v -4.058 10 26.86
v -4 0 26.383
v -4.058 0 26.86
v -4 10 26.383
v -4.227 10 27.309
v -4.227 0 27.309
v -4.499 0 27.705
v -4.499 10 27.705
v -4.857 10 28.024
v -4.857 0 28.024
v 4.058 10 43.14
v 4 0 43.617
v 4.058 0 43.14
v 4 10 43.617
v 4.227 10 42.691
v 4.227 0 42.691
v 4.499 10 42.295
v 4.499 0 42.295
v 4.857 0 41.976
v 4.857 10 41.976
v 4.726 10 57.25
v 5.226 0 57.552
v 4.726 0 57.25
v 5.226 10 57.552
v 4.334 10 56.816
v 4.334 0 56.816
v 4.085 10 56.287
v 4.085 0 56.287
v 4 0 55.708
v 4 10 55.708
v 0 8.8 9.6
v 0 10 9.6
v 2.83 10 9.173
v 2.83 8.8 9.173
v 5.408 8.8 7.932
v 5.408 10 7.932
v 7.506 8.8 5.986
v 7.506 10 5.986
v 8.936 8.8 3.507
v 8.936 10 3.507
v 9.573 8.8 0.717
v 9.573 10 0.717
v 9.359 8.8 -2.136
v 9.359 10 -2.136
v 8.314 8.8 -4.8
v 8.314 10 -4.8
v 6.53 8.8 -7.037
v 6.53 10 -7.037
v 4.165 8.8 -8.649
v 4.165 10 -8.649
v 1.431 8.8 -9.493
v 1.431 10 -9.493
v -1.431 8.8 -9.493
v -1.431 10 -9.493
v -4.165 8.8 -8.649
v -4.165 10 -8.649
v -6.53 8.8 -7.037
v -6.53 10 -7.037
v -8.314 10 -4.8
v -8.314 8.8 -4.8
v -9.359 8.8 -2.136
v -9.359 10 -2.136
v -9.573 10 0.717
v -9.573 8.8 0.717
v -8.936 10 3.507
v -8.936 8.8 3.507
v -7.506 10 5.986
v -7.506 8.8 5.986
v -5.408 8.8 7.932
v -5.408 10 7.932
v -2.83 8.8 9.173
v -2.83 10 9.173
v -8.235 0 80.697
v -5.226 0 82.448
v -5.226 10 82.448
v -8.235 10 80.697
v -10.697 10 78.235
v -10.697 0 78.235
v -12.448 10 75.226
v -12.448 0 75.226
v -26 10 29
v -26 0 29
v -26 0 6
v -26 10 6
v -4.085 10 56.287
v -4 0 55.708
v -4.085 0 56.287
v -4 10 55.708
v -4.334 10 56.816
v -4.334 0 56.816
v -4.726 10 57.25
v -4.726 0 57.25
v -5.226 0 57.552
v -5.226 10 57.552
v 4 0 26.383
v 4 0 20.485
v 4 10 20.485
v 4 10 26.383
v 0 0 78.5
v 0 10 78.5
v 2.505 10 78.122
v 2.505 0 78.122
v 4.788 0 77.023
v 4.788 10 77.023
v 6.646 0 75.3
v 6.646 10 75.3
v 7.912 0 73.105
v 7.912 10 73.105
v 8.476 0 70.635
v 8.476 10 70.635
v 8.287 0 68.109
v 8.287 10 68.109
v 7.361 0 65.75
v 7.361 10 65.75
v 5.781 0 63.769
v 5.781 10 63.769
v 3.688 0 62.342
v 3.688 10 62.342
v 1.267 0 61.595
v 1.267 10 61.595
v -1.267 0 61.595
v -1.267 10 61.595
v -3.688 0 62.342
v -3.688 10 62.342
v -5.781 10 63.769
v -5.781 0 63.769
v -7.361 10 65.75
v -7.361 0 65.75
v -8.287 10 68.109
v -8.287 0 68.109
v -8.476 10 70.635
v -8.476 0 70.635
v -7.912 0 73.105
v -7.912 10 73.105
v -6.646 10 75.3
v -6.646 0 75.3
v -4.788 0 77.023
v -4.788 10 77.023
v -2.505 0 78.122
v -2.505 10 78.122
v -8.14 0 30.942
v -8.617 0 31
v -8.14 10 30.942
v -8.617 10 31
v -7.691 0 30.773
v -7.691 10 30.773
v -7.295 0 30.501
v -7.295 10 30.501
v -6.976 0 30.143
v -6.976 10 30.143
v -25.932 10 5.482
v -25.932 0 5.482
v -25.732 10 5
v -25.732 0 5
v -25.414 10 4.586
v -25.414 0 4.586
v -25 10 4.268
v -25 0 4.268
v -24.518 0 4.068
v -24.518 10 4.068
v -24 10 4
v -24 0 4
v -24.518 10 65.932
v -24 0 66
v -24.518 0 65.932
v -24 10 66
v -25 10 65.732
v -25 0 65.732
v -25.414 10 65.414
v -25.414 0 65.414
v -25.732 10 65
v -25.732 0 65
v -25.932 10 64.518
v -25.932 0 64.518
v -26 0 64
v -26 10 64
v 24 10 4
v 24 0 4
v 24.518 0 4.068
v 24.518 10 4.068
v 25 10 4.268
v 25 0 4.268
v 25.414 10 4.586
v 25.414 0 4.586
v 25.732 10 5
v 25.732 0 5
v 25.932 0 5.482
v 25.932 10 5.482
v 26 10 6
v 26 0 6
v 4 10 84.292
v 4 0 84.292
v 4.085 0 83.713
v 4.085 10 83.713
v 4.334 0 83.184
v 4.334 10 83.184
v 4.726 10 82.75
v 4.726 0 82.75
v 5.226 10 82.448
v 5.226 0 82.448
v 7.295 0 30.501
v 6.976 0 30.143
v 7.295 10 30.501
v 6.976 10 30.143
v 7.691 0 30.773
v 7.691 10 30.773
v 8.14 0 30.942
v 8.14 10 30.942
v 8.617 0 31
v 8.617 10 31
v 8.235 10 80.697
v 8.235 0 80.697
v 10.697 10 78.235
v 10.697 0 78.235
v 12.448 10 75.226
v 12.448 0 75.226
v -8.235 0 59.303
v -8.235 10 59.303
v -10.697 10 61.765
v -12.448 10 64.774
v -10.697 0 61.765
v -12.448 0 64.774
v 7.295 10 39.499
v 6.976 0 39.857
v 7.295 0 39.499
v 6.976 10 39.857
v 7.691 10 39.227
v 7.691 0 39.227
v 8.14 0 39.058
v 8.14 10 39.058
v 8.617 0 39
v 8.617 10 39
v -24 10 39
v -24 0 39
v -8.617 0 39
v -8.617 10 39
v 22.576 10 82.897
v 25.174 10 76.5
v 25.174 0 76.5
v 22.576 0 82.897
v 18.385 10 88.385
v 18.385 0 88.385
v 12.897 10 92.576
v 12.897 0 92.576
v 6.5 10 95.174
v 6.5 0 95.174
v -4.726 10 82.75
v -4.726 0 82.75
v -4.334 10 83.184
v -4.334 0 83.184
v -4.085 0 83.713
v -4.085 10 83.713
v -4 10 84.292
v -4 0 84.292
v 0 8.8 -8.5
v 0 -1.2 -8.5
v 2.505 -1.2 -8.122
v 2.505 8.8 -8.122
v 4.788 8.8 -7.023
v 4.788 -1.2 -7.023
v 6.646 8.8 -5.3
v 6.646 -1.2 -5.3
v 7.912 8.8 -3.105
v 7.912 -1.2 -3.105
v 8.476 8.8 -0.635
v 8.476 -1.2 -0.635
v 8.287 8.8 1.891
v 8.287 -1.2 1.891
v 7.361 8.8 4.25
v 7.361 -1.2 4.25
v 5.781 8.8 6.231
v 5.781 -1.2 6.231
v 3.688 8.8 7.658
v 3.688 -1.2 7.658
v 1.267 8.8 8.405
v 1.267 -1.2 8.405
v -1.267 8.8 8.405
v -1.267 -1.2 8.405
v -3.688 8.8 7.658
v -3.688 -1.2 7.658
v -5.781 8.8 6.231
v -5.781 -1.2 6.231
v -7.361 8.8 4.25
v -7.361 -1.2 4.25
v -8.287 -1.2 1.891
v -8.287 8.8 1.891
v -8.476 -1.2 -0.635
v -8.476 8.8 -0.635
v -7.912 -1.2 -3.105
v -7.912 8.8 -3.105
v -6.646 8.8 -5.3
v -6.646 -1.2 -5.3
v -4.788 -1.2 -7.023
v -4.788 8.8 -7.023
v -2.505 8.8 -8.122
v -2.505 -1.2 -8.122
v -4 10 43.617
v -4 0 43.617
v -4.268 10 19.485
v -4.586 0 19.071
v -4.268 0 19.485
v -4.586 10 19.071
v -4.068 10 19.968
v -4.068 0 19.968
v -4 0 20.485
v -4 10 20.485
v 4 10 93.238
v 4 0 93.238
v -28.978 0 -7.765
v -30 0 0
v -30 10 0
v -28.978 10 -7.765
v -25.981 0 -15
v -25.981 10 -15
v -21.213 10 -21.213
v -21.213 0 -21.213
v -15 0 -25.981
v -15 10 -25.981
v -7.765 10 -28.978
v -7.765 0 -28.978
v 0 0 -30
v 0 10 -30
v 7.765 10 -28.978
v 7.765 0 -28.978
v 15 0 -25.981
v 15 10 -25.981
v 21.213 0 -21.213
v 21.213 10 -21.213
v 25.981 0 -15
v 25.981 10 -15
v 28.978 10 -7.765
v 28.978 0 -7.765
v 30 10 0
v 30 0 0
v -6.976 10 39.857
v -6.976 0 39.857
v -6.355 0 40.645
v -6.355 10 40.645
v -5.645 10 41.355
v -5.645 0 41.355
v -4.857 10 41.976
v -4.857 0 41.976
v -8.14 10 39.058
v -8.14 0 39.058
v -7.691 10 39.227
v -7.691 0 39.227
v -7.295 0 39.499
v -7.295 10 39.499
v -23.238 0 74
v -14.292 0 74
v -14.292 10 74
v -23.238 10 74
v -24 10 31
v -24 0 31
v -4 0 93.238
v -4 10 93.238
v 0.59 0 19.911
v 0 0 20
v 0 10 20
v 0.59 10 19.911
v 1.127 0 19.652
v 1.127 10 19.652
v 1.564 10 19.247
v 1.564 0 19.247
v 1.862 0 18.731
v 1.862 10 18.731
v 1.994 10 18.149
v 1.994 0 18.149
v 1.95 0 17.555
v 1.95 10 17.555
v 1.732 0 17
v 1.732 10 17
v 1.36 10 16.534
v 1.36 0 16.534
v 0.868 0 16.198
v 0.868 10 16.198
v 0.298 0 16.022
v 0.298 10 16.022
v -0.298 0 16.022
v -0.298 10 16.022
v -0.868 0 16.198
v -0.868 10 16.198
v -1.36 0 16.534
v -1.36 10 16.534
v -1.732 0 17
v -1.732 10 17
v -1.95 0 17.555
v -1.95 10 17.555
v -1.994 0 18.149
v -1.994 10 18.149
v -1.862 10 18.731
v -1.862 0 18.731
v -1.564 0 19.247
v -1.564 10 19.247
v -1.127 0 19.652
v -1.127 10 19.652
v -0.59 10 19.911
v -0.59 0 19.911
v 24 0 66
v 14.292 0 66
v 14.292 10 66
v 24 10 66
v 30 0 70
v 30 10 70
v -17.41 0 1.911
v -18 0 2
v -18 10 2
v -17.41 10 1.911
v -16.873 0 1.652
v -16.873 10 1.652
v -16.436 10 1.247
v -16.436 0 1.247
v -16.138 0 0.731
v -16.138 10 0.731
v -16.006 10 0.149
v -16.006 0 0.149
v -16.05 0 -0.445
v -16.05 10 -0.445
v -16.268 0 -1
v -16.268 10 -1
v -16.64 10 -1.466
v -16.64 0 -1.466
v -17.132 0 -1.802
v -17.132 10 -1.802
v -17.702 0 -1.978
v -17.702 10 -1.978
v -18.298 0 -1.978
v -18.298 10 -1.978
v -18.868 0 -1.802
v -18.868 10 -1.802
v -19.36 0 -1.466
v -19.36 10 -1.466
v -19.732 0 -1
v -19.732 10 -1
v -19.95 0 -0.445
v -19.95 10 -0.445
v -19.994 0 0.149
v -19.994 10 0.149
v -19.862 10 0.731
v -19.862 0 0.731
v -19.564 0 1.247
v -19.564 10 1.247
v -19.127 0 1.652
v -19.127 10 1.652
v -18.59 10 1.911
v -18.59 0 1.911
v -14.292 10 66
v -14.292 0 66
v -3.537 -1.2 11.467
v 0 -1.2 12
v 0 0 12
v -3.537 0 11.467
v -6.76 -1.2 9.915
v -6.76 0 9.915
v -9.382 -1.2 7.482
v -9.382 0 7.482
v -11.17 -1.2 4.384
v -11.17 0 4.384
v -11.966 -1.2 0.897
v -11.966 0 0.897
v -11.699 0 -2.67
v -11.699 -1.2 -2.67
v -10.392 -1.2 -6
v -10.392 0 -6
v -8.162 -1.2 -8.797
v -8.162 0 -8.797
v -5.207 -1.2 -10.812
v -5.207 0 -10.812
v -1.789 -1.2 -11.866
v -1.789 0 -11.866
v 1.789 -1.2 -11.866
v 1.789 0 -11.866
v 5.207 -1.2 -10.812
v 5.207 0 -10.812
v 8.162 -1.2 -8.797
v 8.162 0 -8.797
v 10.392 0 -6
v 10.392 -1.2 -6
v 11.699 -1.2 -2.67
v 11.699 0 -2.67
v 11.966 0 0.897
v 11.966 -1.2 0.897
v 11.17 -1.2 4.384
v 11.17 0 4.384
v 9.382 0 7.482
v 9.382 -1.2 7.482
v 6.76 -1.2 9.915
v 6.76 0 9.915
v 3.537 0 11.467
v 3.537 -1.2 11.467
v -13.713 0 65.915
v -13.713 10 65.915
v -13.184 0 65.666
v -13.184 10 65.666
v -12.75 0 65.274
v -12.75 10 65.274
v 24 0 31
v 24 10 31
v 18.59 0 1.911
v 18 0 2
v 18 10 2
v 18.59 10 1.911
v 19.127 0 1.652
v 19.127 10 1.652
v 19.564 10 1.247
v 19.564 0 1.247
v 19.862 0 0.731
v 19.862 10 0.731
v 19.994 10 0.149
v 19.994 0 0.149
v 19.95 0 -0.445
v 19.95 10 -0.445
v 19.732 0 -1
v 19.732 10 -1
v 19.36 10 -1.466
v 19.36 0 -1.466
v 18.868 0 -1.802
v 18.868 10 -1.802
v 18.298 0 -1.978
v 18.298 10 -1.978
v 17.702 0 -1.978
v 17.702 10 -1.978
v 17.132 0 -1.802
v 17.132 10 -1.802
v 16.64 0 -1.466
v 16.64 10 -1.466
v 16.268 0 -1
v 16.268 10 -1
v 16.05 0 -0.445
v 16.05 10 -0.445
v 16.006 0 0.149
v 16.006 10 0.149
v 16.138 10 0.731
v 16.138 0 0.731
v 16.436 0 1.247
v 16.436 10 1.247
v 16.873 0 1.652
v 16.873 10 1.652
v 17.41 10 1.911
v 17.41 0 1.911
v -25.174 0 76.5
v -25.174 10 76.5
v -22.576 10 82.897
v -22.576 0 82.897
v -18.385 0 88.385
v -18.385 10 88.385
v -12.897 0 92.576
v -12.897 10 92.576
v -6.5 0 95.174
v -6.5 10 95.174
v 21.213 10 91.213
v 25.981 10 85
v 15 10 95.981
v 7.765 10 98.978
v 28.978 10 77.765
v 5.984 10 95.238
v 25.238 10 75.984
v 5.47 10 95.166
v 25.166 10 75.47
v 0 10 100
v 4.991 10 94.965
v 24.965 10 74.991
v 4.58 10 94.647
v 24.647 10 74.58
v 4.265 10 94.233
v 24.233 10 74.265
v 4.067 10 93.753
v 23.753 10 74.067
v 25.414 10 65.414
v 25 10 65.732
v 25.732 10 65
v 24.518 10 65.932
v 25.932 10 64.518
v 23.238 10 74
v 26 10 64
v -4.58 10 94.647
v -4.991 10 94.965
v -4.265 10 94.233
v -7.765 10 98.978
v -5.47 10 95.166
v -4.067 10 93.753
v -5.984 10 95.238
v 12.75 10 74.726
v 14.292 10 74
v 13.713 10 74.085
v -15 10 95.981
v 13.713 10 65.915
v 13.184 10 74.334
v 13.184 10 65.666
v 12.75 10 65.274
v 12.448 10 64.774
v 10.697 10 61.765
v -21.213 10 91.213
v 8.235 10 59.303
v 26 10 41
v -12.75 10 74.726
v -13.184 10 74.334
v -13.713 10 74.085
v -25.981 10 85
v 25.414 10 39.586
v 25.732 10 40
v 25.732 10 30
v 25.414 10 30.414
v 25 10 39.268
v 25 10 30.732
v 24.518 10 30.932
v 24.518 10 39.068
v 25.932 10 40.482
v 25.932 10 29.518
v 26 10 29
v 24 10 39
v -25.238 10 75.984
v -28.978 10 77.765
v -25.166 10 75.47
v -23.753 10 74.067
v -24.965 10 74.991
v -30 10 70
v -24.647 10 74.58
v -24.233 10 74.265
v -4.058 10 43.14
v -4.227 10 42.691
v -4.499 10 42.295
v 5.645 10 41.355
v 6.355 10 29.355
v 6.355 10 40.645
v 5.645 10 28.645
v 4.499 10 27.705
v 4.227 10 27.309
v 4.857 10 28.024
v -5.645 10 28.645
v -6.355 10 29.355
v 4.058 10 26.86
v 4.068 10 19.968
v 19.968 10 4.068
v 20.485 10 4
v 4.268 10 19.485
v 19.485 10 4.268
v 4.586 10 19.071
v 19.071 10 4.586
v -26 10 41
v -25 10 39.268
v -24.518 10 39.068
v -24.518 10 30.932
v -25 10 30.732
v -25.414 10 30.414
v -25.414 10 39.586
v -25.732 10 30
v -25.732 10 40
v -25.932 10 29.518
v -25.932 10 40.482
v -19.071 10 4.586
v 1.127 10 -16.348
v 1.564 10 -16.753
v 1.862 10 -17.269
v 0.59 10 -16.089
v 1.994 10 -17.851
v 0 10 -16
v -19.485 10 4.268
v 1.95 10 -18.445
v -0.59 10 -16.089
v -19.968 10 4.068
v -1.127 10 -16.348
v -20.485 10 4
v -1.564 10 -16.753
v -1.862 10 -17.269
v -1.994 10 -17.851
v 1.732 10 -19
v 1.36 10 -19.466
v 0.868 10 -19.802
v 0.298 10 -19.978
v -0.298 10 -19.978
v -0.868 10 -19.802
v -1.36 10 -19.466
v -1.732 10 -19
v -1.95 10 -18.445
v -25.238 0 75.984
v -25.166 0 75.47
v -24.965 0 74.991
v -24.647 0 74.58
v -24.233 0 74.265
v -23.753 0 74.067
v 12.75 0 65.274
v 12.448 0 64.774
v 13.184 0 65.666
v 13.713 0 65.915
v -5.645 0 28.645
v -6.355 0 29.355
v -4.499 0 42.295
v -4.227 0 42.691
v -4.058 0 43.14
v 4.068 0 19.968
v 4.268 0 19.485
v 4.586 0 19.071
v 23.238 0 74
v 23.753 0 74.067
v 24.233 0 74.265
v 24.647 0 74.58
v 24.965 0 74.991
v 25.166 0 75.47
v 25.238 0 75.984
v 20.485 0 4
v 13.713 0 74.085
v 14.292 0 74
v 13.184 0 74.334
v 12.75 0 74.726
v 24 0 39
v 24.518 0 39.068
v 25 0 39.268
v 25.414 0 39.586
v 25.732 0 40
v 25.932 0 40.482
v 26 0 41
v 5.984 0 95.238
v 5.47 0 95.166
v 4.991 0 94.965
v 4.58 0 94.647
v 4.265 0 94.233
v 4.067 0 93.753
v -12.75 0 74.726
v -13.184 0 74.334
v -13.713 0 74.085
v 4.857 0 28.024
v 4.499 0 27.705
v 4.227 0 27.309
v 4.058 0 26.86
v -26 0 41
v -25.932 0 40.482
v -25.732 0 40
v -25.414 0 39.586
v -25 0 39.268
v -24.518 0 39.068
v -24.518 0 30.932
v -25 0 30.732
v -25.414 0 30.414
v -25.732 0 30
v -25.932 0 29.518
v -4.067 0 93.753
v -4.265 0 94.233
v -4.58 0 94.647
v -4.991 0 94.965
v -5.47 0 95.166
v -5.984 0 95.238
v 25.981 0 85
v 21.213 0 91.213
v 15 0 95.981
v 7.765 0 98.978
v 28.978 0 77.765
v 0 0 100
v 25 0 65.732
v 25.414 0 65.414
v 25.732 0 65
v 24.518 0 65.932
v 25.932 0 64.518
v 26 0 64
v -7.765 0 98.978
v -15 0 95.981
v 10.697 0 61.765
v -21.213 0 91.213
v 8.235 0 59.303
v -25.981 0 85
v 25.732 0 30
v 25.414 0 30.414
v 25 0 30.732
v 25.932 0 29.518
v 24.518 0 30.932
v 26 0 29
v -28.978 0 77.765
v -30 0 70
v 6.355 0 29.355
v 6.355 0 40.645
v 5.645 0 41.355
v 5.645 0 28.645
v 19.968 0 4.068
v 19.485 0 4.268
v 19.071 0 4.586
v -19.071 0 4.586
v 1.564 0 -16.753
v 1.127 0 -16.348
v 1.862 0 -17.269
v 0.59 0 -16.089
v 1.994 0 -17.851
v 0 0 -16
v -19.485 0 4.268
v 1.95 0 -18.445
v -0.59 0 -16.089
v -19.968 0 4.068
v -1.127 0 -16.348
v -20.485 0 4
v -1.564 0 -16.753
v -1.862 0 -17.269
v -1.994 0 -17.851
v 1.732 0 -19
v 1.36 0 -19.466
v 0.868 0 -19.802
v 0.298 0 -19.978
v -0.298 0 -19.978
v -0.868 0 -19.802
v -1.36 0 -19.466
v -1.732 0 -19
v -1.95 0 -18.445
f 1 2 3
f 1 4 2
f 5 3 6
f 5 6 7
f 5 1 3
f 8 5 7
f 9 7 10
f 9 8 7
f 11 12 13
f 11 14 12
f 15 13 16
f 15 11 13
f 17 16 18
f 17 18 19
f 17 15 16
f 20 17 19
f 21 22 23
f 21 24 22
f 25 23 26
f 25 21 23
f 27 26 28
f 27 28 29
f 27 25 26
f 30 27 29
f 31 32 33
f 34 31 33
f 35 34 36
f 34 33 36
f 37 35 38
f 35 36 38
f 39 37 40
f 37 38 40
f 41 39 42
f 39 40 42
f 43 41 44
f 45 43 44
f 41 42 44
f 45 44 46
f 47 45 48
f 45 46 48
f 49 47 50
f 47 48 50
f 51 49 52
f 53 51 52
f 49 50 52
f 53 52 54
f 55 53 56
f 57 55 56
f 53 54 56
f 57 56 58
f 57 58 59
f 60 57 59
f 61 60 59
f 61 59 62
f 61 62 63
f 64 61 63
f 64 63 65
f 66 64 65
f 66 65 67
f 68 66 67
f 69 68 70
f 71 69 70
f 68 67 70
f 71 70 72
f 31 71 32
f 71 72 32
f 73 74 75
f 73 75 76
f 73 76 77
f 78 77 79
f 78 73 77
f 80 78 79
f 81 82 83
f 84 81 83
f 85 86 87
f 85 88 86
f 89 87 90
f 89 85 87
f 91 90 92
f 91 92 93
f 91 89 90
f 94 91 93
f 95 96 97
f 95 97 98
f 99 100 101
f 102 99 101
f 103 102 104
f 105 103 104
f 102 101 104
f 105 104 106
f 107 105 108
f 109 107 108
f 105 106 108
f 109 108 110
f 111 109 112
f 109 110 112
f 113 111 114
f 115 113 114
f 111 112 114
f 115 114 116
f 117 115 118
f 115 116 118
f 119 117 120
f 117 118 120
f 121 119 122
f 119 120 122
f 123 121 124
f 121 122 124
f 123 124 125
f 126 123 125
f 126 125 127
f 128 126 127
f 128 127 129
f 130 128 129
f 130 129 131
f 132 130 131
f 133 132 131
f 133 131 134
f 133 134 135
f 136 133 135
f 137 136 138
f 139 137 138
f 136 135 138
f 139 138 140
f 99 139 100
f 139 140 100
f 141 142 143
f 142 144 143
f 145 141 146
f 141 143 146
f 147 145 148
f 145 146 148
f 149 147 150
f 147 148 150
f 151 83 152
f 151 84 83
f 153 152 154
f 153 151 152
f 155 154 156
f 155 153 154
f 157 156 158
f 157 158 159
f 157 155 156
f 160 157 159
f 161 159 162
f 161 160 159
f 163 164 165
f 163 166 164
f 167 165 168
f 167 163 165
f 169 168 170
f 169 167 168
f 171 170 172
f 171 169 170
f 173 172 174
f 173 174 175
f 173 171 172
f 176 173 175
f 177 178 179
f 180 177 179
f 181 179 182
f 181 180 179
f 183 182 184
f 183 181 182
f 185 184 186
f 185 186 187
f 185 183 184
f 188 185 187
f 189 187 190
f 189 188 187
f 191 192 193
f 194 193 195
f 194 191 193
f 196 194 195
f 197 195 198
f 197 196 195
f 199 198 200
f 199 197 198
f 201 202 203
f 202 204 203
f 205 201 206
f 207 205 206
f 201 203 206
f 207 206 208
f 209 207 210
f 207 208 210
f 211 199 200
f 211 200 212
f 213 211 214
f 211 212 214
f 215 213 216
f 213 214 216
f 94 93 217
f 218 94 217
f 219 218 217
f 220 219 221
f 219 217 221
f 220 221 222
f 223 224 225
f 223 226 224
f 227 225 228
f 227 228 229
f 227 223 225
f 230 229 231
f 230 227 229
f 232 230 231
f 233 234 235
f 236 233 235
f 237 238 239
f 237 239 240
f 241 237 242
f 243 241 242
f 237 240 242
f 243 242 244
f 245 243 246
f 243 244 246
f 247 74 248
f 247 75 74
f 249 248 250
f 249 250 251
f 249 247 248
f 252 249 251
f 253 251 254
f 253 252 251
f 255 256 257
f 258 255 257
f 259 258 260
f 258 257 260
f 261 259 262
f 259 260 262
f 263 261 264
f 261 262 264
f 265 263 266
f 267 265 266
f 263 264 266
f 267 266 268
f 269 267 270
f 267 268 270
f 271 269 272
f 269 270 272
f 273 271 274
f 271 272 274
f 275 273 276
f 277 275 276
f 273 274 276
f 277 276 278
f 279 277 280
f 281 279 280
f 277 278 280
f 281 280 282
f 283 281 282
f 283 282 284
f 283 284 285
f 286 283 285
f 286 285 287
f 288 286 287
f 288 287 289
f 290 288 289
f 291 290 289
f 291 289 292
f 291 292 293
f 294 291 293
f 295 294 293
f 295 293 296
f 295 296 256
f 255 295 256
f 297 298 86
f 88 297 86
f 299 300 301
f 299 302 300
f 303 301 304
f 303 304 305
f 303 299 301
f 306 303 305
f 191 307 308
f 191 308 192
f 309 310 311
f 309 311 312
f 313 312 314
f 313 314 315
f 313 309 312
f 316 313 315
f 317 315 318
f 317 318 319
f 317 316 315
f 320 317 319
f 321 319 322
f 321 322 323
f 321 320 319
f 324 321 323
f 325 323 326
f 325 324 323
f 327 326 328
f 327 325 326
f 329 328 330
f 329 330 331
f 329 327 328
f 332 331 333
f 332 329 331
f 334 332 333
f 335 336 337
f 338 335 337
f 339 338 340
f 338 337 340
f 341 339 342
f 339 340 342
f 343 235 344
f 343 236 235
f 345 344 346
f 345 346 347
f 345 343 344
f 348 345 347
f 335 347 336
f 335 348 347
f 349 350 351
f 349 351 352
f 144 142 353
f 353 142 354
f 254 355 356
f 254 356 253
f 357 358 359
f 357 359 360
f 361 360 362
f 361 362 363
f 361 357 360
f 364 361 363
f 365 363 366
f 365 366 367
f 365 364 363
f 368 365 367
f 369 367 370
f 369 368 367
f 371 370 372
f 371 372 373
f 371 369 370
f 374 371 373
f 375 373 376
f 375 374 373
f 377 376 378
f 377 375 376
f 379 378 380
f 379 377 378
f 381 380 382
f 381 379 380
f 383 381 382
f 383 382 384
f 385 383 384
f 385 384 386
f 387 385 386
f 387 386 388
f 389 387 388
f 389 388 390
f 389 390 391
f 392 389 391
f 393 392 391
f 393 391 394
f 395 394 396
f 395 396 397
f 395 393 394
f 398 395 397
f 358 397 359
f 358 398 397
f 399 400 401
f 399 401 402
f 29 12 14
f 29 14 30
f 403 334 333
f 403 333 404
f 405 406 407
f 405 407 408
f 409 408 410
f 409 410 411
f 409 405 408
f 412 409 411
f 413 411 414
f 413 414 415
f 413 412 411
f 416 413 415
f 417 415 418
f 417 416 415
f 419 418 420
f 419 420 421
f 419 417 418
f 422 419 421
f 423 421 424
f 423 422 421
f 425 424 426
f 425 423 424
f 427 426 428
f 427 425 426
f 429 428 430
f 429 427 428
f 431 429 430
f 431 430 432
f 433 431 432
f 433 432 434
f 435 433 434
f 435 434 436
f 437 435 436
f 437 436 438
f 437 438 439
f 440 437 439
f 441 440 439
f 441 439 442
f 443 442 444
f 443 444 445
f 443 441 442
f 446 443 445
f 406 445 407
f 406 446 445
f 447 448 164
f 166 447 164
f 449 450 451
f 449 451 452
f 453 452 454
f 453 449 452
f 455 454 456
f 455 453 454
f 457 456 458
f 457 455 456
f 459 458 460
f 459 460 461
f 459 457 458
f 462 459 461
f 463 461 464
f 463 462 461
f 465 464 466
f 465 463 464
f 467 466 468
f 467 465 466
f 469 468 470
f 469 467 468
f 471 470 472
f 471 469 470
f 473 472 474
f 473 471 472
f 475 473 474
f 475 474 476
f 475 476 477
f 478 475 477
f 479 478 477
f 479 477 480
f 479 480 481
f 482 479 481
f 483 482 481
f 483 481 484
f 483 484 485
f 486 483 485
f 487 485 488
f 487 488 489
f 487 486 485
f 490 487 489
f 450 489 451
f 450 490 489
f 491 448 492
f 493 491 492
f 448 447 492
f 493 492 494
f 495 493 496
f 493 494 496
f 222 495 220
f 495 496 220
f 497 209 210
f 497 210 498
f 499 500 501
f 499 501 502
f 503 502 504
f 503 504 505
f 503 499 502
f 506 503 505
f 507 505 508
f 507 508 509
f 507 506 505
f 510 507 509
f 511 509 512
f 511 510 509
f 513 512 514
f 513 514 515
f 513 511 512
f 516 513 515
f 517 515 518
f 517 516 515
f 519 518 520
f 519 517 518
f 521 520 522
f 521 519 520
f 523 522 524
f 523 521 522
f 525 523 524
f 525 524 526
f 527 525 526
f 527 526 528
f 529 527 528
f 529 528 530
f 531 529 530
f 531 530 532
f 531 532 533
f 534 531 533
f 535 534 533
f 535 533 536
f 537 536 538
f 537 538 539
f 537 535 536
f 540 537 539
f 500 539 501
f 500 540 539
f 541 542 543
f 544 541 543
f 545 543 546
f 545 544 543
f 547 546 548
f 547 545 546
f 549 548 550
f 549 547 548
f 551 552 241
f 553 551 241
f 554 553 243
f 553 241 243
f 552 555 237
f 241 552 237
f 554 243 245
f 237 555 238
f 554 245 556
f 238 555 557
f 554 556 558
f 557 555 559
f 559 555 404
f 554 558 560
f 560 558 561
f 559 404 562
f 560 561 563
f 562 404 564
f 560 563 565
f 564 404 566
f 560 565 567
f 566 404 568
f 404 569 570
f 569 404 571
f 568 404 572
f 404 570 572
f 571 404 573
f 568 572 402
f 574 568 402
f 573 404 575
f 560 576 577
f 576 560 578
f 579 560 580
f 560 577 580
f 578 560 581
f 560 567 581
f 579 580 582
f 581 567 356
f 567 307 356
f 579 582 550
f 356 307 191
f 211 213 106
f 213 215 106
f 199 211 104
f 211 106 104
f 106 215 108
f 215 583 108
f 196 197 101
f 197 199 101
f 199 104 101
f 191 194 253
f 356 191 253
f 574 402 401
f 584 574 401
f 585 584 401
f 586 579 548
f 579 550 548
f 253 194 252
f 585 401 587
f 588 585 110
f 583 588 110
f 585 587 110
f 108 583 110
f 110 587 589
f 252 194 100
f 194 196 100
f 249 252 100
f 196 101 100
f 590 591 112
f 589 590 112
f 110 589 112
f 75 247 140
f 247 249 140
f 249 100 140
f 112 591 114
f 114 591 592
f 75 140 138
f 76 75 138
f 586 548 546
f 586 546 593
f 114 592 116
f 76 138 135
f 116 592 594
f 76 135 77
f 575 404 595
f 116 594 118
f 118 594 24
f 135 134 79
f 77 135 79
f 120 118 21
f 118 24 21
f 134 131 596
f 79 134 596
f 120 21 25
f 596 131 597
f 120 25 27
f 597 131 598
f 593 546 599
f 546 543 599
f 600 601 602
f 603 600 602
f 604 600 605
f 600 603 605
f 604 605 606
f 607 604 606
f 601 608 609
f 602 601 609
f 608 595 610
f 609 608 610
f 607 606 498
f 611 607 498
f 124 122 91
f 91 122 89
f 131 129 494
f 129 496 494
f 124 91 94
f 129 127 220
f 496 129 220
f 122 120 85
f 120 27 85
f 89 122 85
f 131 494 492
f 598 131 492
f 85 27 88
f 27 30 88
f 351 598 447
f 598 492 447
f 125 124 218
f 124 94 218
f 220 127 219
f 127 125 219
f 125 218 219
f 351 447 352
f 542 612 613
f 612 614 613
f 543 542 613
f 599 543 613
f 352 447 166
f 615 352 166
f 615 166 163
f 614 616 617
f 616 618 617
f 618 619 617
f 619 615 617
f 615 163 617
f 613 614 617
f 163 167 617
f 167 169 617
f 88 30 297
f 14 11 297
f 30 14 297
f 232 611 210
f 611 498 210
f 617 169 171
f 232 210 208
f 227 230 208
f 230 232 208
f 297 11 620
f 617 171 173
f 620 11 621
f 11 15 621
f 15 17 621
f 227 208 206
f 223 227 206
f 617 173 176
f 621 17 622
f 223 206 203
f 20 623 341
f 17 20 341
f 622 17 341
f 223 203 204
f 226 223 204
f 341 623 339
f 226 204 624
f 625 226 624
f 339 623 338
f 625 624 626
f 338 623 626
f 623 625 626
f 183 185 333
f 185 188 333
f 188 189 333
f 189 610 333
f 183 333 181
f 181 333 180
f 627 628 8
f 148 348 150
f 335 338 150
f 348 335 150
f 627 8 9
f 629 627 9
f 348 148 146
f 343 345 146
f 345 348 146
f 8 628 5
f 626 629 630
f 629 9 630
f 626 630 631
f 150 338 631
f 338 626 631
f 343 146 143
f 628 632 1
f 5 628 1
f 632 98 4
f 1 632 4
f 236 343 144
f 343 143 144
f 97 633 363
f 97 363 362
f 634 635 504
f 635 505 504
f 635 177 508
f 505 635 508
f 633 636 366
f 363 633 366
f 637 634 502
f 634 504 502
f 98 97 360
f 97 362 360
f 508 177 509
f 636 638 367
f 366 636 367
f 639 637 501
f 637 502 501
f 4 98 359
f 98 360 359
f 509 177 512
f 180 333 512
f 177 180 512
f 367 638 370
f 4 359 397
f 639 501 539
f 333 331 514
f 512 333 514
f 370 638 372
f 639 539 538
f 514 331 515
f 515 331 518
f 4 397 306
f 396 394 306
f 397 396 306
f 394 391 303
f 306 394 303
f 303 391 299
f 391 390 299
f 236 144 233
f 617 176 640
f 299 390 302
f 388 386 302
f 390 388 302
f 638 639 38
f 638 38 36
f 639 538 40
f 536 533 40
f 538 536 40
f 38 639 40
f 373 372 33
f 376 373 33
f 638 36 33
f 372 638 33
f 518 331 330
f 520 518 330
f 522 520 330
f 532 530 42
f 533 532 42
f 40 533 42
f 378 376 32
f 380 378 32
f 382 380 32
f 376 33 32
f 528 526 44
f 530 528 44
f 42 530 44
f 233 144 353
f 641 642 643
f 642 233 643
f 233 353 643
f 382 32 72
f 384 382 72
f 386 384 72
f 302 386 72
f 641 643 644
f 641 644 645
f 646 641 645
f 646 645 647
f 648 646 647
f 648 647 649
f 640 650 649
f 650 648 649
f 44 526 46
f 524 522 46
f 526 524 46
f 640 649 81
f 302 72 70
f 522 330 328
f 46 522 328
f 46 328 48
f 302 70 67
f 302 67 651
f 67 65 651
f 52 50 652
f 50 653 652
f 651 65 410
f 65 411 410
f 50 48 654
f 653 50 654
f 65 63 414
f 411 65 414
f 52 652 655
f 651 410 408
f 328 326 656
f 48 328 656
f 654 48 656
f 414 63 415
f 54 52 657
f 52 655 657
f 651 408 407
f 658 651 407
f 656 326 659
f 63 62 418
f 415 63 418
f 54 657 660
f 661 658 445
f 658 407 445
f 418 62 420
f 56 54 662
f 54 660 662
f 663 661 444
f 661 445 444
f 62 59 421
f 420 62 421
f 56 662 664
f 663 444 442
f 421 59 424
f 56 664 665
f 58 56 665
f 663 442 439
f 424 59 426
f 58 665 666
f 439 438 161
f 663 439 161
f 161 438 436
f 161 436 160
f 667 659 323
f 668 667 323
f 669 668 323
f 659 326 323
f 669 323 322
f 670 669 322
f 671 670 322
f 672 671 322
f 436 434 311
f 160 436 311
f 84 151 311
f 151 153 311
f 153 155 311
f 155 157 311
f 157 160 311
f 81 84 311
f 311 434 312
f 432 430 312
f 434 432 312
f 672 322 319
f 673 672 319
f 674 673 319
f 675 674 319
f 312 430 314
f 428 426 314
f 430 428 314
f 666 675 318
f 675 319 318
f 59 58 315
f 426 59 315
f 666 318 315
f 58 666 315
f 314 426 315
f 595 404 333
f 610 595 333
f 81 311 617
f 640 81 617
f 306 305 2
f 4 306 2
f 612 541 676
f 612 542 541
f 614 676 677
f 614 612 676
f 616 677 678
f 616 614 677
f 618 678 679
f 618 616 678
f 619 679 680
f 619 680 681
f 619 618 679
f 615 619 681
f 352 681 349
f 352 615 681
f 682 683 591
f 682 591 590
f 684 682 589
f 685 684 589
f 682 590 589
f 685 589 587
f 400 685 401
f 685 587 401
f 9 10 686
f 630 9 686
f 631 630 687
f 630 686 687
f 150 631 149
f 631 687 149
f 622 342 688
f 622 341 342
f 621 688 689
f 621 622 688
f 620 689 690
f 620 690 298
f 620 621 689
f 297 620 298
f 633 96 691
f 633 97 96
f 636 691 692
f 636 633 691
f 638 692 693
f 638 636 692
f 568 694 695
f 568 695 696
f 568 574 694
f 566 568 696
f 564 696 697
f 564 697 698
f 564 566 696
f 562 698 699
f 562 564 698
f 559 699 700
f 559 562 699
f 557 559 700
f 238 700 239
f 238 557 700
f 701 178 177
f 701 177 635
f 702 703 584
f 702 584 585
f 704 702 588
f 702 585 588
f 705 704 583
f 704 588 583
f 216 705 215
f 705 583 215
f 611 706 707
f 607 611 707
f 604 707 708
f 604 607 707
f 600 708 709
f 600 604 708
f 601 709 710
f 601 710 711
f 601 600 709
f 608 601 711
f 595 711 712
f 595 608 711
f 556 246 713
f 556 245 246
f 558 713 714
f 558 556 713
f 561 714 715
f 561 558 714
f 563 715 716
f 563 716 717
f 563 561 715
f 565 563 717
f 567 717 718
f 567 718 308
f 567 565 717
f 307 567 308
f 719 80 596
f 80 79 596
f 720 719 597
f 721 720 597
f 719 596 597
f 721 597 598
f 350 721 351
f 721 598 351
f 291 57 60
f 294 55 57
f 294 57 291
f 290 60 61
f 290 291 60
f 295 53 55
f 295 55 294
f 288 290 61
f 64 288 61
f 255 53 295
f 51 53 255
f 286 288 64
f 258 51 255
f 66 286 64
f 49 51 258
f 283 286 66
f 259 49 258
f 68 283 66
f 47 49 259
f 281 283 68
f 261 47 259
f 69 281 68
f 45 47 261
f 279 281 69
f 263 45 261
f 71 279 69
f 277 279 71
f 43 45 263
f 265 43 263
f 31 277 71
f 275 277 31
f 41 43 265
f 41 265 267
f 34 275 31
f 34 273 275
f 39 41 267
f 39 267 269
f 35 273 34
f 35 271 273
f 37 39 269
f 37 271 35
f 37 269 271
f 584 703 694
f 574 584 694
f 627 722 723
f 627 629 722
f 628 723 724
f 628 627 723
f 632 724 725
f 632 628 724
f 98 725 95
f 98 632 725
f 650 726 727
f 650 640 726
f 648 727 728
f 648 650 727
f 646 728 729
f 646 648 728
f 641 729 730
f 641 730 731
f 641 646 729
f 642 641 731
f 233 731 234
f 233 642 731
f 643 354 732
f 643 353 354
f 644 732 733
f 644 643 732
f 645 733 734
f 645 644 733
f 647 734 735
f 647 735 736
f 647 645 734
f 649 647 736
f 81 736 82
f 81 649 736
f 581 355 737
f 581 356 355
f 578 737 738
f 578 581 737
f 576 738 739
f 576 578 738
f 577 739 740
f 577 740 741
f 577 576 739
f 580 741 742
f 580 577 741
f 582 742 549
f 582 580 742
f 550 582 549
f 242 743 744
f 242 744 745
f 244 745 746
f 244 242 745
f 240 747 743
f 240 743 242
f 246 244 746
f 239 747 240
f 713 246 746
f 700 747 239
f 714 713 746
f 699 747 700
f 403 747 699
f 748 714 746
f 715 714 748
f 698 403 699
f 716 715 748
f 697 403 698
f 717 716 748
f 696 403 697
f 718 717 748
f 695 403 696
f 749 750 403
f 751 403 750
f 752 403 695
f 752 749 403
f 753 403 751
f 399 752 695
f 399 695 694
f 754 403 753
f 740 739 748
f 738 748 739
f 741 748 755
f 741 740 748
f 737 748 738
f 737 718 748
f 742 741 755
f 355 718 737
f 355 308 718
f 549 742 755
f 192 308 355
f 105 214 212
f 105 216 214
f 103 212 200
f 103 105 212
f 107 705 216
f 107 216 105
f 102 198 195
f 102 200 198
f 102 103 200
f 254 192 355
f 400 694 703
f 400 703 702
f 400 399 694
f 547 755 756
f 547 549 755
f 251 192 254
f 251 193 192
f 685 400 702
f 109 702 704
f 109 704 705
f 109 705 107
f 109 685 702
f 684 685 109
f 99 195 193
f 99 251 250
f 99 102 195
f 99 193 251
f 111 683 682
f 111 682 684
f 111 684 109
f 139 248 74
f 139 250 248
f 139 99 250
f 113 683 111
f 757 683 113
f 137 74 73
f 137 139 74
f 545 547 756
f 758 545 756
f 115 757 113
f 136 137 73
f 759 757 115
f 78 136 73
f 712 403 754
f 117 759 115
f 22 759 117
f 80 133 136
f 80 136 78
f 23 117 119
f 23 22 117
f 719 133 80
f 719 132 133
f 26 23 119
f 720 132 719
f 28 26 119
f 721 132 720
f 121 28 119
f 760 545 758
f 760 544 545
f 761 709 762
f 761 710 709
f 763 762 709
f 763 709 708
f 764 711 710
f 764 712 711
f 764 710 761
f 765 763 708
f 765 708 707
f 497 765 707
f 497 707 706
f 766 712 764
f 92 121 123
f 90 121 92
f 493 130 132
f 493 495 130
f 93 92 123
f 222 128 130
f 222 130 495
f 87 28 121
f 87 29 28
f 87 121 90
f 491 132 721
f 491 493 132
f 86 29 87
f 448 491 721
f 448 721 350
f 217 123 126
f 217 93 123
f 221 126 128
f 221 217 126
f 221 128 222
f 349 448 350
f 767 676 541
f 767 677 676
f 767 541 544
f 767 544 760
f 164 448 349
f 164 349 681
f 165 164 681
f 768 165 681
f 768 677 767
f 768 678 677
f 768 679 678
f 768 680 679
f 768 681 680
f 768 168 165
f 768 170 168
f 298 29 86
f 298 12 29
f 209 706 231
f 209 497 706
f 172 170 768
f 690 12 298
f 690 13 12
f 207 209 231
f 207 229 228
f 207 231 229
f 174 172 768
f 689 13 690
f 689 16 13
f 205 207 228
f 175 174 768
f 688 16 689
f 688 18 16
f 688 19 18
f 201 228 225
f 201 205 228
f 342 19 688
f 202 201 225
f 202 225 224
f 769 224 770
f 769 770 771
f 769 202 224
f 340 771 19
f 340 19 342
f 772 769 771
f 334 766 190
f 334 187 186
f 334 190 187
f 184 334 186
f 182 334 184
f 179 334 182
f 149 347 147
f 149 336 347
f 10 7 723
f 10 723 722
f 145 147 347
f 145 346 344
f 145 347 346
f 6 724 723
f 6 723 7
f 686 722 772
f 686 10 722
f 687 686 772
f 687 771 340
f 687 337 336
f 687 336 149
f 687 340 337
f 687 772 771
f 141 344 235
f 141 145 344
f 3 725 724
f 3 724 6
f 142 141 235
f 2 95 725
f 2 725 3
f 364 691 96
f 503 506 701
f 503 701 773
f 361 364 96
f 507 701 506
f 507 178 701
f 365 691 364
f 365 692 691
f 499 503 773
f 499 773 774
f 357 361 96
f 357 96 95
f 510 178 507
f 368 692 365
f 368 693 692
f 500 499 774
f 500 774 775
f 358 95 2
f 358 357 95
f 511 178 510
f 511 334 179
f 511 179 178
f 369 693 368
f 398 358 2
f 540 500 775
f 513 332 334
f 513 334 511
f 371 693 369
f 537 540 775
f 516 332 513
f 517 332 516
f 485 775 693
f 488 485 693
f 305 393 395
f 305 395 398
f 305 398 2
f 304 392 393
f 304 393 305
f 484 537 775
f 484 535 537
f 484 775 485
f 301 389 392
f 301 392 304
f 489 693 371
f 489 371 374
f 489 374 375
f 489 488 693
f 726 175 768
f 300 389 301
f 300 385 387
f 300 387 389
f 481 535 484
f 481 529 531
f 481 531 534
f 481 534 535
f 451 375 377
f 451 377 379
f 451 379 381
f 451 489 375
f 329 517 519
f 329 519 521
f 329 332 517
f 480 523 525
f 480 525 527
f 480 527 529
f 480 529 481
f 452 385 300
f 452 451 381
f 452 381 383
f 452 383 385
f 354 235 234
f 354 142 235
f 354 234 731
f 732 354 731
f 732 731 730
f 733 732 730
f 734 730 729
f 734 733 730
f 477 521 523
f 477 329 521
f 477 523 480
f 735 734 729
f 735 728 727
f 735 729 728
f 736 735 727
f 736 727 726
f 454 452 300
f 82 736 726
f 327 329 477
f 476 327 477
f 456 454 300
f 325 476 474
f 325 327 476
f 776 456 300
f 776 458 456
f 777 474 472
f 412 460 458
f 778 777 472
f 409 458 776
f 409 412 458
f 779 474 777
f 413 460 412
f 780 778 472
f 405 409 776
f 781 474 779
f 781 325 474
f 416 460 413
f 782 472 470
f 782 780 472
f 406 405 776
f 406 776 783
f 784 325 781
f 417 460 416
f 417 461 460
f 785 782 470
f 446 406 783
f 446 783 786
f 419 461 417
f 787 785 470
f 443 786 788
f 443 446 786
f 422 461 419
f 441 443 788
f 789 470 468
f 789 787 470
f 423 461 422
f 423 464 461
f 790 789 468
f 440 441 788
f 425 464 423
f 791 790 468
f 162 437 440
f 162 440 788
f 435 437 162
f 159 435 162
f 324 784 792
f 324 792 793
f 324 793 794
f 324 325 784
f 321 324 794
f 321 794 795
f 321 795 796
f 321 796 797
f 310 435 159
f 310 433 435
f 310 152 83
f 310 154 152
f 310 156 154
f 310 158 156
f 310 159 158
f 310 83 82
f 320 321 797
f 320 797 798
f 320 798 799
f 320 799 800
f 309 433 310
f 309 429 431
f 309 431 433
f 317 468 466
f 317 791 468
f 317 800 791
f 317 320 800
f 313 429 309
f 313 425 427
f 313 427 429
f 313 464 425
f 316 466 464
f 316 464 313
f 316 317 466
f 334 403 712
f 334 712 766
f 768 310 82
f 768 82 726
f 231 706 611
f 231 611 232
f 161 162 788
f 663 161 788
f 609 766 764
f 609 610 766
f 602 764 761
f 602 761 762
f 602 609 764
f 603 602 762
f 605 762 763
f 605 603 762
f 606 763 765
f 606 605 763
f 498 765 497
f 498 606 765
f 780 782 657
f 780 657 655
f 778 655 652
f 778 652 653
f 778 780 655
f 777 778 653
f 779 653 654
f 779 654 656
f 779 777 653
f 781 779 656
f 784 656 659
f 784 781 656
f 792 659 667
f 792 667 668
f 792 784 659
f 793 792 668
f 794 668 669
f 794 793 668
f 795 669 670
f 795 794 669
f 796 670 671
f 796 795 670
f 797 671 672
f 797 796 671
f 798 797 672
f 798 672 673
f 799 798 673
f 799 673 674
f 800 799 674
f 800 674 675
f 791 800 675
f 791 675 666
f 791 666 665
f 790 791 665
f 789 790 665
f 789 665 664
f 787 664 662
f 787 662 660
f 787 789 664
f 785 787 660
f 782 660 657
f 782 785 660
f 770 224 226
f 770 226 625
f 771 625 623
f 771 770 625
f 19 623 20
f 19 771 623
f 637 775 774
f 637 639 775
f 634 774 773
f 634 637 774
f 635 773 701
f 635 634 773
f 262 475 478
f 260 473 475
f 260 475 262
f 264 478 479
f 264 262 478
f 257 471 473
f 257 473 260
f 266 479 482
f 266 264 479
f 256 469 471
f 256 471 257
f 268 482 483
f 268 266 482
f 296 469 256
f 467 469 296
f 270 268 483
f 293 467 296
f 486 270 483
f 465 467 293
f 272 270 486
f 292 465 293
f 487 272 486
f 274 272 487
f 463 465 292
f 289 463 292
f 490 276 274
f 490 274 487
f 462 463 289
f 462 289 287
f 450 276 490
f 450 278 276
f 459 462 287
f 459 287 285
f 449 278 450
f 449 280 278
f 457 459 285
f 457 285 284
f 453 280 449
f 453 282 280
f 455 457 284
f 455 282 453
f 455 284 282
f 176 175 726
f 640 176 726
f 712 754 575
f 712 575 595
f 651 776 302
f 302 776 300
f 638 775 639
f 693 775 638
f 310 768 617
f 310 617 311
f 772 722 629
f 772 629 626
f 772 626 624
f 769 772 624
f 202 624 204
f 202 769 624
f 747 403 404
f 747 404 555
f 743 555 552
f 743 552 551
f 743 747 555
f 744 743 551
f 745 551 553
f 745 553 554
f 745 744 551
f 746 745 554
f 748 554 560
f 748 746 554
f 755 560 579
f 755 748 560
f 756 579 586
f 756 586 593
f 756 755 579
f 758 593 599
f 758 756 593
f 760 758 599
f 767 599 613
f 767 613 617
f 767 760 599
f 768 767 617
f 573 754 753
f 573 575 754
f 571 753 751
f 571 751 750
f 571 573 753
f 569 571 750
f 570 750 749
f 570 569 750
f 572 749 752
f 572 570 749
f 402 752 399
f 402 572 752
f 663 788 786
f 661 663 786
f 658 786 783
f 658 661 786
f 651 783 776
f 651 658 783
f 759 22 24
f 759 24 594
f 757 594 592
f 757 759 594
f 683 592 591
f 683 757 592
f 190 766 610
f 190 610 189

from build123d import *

# Parameters (mm, degrees)
SKETCH_1_R             = 4
SKETCH_1_R_2           = 2
EXTRUDE_1_DEPTH        = 10
SKETCH_2_R             = 8.5
CUT_EXTRUDE_1_DEPTH    = 10
SKETCH_4_R             = 2.5
CUT_EXTRUDE_3_DEPTH    = 30
CUT_EXTRUDE_8_DEPTH    = 10
FILLET_1_R             = 2
FILLET_1_OF_MIRROR_1_R = 2
SKETCH_11_R            = 2.5
EXTRUDE_2_DEPTH        = 10
SKETCH_12_R            = 8.5
CUT_EXTRUDE_10_DEPTH   = 21
SKETCH_13_R            = 9.6
CUT_EXTRUDE_11_DEPTH   = 1.2
EXTRUDE_START          = 1.2
SKETCH_14_R            = 12
SKETCH_14_R_2          = 8.5
EXTRUDE_3_DEPTH        = 1.2


with BuildPart() as part:
    # 草图1 → 凸台-拉伸1 (new body)
    with BuildSketch(Plane(origin=(0, 0, 0), x_dir=(1, 0, 0), z_dir=(0, 1, 0))):
        with BuildLine():
            Line((30, 0), (30, -70.000015024))
            ThreePointArc((30, -70.000015024), (-7.512e-06, -100.000015025), (-30, -70))
            Line((-30, -70), (-30, 0))
            ThreePointArc((-30, 0), (0, 30), (30, 0))
        make_face()
        with Locations(Location((0, 0, 0), (0, 0, 270))):
            Circle(SKETCH_1_R, mode=Mode.SUBTRACT)
        with Locations(Location((0, 18, 0), (0, 0, 270))):
            Circle(SKETCH_1_R_2, mode=Mode.SUBTRACT)
        with Locations(Location((18, 0, 0), (0, 0, 270))):
            Circle(SKETCH_1_R_2, mode=Mode.SUBTRACT)
        with Locations(Location((0, -18, 0), (0, 0, 270))):
            Circle(SKETCH_1_R_2, mode=Mode.SUBTRACT)
        with Locations(Location((-18, 0, 0), (0, 0, 270))):
            Circle(SKETCH_1_R_2, mode=Mode.SUBTRACT)
    extrude(amount=EXTRUDE_1_DEPTH)

    # 草图2 → 切除-拉伸1 (cut)
    with BuildSketch(Plane(origin=(0, 10, 0), x_dir=(1, 0, 0), z_dir=(0, 1, 0))):
        with Locations(Location((0, -70.000015025, 0), (0, 0, 270))):
            Circle(SKETCH_2_R)
    extrude(amount=-CUT_EXTRUDE_1_DEPTH, mode=Mode.SUBTRACT)

    # 草图4 → 切除-拉伸3 (cut)
    with BuildSketch(Plane.XZ):
        with Locations(Location((0, 35.000007512, 0), (0, 0, 270))):
            Circle(SKETCH_4_R)
    extrude(amount=-CUT_EXTRUDE_3_DEPTH, mode=Mode.SUBTRACT)

    # 草图9 → 切除-拉伸8 (cut)
    with BuildSketch(Plane(origin=(0, 0, 0), x_dir=(-1, 0, 0), z_dir=(0, -1, 0))):
        with BuildLine():
            Line((7.5, -31.000007512), (26, -31.000007512))
            Line((26, -31.000007512), (26, -4))
            Line((26, -4), (19.656854249, -4))
            Line((19.656854249, -4), (4, -19.656854249))
            Line((4, -19.656854249), (4, -27.500007512))
            ThreePointArc((4, -27.500007512), (6.01040764, -28.989599872), (7.5, -31.000007512))
        make_face()
        with BuildLine():
            Line((12.893794955, -66.000008567), (26, -66.000002003))
            Line((26, -66.000002003), (26, -39.000007512))
            Line((26, -39.000007512), (7.5, -39.000007512))
            ThreePointArc((7.5, -39.000007512), (6.01040764, -41.010415152), (4, -42.500007512))
            Line((4, -42.500007512), (4, -57.106218067))
            ThreePointArc((4, -57.106218067), (9.545939156, -60.454071088), (12.893794955, -66.000008567))
        make_face()
        with BuildLine():
            Line((12.893798962, -74.000008567), (25.690467161, -74.000002158))
            ThreePointArc((25.690467161, -74.000002158), (18.384780915, -88.384786732), (4, -95.690480182))
            Line((4, -95.690480182), (4, -82.893811983))
            ThreePointArc((4, -82.893811983), (9.545943936, -79.54595418), (12.893798962, -74.000008567))
        make_face()
    cut_extrude_8 = extrude(amount=-CUT_EXTRUDE_8_DEPTH, mode=Mode.SUBTRACT)

    # 圆角1
    fillet_1_edges = [part.edges().sort_by_distance(p)[0] for p in [
        (-26, 5, 4),
        (-26, 5, 31.000007512),
        (-7.5, 5, 31.000007512),
        (-4, 5, 27.500007512),
        (-4, 5, 19.656854249),
        (-19.656854249, 5, 4),
        (-4, 5, 42.500007512),
        (-7.5, 5, 39.000007512),
        (-26, 5, 39.000007512),
        (-26, 5, 66.000002003),
        (-12.893794955, 5, 66.000008567),
        (-4, 5, 57.106218067),
        (-25.690467161, 5, 74.000002158),
        (-4, 5, 95.690480182),
        (-4, 5, 82.893811983),
        (-12.893798962, 5, 74.000008567),
    ]]
    fillet(fillet_1_edges, radius=FILLET_1_R)

    # 镜向1: 切除-拉伸8 across plane
    add(cut_extrude_8.mirror(Plane.ZY), mode=Mode.SUBTRACT)

    # 圆角1 of 镜向1
    fillet_1_of_mirror_1_edges = [part.edges().sort_by_distance(p)[0] for p in [
        (26, 5, 4),
        (26, 5, 31.000007512),
        (7.5, 5, 31.000007512),
        (4, 5, 27.500007512),
        (4, 5, 19.656854249),
        (19.656854249, 5, 4),
        (4, 5, 42.500007512),
        (7.5, 5, 39.000007512),
        (26, 5, 39.000007512),
        (26, 5, 66.000002003),
        (12.893794955, 5, 66.000008567),
        (4, 5, 57.106218067),
        (25.690467161, 5, 74.000002158),
        (4, 5, 95.690480182),
        (4, 5, 82.893811983),
        (12.893798962, 5, 74.000008567),
    ]]
    fillet(fillet_1_of_mirror_1_edges, radius=FILLET_1_OF_MIRROR_1_R)

    # 草图11 → 凸台-拉伸2 (add)
    with BuildSketch(Plane(origin=(0, 0, 0), x_dir=(-1, 0, 0), z_dir=(0, -1, 0))):
        with Locations((0, -35.000007512)):
            Circle(SKETCH_11_R)
    extrude(amount=-EXTRUDE_2_DEPTH)

    # 草图12 → 切除-拉伸10 (cut)
    with BuildSketch(Plane(origin=(0, 0, 0), x_dir=(-1, 0, 0), z_dir=(0, -1, 0))):
        with Locations(Location((0, 0, 0), (0, 0, 90))):
            Circle(SKETCH_12_R)
    extrude(amount=-CUT_EXTRUDE_10_DEPTH, mode=Mode.SUBTRACT)

    # 草图13 → 切除-拉伸11 (cut)
    with BuildSketch(Plane(origin=(0, 10, 0), x_dir=(1, 0, 0), z_dir=(0, 1, 0))):
        with Locations(Location((0, 0, 0), (0, 0, 270))):
            Circle(SKETCH_13_R)
    extrude(amount=-CUT_EXTRUDE_11_DEPTH, mode=Mode.SUBTRACT)

    # 草图14 → 凸台-拉伸3 (add)
    with BuildSketch(Plane(origin=(0, 0, 0), x_dir=(-1, 0, 0), z_dir=(0, -1, 0)).offset(EXTRUDE_START)):
        with Locations(Location((0, 0, 0), (0, 0, 270))):
            Circle(SKETCH_14_R)
        with Locations(Location((0, 0, 0), (0, 0, 90))):
            Circle(SKETCH_14_R_2, mode=Mode.SUBTRACT)
    extrude(amount=-EXTRUDE_3_DEPTH)


solid = part.part
